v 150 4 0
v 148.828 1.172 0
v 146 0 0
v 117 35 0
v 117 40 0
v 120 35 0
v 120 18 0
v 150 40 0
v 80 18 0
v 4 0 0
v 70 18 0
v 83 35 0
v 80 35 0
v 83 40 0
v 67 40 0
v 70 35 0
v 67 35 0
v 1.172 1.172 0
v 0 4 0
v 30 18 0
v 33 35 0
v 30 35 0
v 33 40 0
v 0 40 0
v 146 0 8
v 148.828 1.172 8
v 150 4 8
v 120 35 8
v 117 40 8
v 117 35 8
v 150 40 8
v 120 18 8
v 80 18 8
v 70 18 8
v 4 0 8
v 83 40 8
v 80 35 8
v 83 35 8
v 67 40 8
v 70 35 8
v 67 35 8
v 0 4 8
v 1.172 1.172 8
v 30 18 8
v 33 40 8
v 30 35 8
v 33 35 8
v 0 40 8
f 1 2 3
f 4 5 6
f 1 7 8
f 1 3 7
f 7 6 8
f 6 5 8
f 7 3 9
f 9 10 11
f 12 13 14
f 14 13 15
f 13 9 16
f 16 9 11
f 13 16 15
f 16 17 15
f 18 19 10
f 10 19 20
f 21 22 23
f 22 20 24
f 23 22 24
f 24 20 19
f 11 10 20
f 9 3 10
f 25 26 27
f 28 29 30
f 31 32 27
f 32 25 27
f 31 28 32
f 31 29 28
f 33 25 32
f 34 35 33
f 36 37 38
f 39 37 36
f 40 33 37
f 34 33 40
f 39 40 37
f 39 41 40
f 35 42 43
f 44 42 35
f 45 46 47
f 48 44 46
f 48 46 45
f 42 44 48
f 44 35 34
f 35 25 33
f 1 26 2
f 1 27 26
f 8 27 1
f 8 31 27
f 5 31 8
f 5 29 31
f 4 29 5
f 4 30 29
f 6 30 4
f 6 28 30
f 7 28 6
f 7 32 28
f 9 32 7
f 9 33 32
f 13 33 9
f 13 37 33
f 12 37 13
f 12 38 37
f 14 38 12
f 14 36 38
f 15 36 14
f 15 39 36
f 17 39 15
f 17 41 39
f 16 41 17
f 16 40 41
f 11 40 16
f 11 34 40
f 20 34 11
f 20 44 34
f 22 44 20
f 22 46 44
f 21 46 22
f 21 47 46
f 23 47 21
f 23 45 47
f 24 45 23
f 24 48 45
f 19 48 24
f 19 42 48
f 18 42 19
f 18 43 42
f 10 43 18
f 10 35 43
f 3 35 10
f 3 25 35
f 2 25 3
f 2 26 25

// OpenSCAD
$fn = 32;

// ----------------------------------------------------------------------
// Oversize slot bar: 150 mm bar with 2 oversize windows
// ----------------------------------------------------------------------

// --- parameters (mm) ---
profile_height = 8;       // extrusion height
profile_points = 24;      // points of the closed outline

profile = [[0, 4], [1.172, 1.172], [4, 0], [146, 0], [148.828, 1.172], [150, 4], [150, 40], [117, 40], [117, 35], [120, 35], [120, 18], [80, 18], [80, 35], [83, 35], [83, 40], [67, 40], [67, 35], [70, 35], [70, 18], [30, 18], [30, 35], [33, 35], [33, 40], [0, 40]];  // single closed polygon, 24 points, counter clockwise

// --- the one profile operation ---
linear_extrude(height = profile_height) polygon(points = profile);
